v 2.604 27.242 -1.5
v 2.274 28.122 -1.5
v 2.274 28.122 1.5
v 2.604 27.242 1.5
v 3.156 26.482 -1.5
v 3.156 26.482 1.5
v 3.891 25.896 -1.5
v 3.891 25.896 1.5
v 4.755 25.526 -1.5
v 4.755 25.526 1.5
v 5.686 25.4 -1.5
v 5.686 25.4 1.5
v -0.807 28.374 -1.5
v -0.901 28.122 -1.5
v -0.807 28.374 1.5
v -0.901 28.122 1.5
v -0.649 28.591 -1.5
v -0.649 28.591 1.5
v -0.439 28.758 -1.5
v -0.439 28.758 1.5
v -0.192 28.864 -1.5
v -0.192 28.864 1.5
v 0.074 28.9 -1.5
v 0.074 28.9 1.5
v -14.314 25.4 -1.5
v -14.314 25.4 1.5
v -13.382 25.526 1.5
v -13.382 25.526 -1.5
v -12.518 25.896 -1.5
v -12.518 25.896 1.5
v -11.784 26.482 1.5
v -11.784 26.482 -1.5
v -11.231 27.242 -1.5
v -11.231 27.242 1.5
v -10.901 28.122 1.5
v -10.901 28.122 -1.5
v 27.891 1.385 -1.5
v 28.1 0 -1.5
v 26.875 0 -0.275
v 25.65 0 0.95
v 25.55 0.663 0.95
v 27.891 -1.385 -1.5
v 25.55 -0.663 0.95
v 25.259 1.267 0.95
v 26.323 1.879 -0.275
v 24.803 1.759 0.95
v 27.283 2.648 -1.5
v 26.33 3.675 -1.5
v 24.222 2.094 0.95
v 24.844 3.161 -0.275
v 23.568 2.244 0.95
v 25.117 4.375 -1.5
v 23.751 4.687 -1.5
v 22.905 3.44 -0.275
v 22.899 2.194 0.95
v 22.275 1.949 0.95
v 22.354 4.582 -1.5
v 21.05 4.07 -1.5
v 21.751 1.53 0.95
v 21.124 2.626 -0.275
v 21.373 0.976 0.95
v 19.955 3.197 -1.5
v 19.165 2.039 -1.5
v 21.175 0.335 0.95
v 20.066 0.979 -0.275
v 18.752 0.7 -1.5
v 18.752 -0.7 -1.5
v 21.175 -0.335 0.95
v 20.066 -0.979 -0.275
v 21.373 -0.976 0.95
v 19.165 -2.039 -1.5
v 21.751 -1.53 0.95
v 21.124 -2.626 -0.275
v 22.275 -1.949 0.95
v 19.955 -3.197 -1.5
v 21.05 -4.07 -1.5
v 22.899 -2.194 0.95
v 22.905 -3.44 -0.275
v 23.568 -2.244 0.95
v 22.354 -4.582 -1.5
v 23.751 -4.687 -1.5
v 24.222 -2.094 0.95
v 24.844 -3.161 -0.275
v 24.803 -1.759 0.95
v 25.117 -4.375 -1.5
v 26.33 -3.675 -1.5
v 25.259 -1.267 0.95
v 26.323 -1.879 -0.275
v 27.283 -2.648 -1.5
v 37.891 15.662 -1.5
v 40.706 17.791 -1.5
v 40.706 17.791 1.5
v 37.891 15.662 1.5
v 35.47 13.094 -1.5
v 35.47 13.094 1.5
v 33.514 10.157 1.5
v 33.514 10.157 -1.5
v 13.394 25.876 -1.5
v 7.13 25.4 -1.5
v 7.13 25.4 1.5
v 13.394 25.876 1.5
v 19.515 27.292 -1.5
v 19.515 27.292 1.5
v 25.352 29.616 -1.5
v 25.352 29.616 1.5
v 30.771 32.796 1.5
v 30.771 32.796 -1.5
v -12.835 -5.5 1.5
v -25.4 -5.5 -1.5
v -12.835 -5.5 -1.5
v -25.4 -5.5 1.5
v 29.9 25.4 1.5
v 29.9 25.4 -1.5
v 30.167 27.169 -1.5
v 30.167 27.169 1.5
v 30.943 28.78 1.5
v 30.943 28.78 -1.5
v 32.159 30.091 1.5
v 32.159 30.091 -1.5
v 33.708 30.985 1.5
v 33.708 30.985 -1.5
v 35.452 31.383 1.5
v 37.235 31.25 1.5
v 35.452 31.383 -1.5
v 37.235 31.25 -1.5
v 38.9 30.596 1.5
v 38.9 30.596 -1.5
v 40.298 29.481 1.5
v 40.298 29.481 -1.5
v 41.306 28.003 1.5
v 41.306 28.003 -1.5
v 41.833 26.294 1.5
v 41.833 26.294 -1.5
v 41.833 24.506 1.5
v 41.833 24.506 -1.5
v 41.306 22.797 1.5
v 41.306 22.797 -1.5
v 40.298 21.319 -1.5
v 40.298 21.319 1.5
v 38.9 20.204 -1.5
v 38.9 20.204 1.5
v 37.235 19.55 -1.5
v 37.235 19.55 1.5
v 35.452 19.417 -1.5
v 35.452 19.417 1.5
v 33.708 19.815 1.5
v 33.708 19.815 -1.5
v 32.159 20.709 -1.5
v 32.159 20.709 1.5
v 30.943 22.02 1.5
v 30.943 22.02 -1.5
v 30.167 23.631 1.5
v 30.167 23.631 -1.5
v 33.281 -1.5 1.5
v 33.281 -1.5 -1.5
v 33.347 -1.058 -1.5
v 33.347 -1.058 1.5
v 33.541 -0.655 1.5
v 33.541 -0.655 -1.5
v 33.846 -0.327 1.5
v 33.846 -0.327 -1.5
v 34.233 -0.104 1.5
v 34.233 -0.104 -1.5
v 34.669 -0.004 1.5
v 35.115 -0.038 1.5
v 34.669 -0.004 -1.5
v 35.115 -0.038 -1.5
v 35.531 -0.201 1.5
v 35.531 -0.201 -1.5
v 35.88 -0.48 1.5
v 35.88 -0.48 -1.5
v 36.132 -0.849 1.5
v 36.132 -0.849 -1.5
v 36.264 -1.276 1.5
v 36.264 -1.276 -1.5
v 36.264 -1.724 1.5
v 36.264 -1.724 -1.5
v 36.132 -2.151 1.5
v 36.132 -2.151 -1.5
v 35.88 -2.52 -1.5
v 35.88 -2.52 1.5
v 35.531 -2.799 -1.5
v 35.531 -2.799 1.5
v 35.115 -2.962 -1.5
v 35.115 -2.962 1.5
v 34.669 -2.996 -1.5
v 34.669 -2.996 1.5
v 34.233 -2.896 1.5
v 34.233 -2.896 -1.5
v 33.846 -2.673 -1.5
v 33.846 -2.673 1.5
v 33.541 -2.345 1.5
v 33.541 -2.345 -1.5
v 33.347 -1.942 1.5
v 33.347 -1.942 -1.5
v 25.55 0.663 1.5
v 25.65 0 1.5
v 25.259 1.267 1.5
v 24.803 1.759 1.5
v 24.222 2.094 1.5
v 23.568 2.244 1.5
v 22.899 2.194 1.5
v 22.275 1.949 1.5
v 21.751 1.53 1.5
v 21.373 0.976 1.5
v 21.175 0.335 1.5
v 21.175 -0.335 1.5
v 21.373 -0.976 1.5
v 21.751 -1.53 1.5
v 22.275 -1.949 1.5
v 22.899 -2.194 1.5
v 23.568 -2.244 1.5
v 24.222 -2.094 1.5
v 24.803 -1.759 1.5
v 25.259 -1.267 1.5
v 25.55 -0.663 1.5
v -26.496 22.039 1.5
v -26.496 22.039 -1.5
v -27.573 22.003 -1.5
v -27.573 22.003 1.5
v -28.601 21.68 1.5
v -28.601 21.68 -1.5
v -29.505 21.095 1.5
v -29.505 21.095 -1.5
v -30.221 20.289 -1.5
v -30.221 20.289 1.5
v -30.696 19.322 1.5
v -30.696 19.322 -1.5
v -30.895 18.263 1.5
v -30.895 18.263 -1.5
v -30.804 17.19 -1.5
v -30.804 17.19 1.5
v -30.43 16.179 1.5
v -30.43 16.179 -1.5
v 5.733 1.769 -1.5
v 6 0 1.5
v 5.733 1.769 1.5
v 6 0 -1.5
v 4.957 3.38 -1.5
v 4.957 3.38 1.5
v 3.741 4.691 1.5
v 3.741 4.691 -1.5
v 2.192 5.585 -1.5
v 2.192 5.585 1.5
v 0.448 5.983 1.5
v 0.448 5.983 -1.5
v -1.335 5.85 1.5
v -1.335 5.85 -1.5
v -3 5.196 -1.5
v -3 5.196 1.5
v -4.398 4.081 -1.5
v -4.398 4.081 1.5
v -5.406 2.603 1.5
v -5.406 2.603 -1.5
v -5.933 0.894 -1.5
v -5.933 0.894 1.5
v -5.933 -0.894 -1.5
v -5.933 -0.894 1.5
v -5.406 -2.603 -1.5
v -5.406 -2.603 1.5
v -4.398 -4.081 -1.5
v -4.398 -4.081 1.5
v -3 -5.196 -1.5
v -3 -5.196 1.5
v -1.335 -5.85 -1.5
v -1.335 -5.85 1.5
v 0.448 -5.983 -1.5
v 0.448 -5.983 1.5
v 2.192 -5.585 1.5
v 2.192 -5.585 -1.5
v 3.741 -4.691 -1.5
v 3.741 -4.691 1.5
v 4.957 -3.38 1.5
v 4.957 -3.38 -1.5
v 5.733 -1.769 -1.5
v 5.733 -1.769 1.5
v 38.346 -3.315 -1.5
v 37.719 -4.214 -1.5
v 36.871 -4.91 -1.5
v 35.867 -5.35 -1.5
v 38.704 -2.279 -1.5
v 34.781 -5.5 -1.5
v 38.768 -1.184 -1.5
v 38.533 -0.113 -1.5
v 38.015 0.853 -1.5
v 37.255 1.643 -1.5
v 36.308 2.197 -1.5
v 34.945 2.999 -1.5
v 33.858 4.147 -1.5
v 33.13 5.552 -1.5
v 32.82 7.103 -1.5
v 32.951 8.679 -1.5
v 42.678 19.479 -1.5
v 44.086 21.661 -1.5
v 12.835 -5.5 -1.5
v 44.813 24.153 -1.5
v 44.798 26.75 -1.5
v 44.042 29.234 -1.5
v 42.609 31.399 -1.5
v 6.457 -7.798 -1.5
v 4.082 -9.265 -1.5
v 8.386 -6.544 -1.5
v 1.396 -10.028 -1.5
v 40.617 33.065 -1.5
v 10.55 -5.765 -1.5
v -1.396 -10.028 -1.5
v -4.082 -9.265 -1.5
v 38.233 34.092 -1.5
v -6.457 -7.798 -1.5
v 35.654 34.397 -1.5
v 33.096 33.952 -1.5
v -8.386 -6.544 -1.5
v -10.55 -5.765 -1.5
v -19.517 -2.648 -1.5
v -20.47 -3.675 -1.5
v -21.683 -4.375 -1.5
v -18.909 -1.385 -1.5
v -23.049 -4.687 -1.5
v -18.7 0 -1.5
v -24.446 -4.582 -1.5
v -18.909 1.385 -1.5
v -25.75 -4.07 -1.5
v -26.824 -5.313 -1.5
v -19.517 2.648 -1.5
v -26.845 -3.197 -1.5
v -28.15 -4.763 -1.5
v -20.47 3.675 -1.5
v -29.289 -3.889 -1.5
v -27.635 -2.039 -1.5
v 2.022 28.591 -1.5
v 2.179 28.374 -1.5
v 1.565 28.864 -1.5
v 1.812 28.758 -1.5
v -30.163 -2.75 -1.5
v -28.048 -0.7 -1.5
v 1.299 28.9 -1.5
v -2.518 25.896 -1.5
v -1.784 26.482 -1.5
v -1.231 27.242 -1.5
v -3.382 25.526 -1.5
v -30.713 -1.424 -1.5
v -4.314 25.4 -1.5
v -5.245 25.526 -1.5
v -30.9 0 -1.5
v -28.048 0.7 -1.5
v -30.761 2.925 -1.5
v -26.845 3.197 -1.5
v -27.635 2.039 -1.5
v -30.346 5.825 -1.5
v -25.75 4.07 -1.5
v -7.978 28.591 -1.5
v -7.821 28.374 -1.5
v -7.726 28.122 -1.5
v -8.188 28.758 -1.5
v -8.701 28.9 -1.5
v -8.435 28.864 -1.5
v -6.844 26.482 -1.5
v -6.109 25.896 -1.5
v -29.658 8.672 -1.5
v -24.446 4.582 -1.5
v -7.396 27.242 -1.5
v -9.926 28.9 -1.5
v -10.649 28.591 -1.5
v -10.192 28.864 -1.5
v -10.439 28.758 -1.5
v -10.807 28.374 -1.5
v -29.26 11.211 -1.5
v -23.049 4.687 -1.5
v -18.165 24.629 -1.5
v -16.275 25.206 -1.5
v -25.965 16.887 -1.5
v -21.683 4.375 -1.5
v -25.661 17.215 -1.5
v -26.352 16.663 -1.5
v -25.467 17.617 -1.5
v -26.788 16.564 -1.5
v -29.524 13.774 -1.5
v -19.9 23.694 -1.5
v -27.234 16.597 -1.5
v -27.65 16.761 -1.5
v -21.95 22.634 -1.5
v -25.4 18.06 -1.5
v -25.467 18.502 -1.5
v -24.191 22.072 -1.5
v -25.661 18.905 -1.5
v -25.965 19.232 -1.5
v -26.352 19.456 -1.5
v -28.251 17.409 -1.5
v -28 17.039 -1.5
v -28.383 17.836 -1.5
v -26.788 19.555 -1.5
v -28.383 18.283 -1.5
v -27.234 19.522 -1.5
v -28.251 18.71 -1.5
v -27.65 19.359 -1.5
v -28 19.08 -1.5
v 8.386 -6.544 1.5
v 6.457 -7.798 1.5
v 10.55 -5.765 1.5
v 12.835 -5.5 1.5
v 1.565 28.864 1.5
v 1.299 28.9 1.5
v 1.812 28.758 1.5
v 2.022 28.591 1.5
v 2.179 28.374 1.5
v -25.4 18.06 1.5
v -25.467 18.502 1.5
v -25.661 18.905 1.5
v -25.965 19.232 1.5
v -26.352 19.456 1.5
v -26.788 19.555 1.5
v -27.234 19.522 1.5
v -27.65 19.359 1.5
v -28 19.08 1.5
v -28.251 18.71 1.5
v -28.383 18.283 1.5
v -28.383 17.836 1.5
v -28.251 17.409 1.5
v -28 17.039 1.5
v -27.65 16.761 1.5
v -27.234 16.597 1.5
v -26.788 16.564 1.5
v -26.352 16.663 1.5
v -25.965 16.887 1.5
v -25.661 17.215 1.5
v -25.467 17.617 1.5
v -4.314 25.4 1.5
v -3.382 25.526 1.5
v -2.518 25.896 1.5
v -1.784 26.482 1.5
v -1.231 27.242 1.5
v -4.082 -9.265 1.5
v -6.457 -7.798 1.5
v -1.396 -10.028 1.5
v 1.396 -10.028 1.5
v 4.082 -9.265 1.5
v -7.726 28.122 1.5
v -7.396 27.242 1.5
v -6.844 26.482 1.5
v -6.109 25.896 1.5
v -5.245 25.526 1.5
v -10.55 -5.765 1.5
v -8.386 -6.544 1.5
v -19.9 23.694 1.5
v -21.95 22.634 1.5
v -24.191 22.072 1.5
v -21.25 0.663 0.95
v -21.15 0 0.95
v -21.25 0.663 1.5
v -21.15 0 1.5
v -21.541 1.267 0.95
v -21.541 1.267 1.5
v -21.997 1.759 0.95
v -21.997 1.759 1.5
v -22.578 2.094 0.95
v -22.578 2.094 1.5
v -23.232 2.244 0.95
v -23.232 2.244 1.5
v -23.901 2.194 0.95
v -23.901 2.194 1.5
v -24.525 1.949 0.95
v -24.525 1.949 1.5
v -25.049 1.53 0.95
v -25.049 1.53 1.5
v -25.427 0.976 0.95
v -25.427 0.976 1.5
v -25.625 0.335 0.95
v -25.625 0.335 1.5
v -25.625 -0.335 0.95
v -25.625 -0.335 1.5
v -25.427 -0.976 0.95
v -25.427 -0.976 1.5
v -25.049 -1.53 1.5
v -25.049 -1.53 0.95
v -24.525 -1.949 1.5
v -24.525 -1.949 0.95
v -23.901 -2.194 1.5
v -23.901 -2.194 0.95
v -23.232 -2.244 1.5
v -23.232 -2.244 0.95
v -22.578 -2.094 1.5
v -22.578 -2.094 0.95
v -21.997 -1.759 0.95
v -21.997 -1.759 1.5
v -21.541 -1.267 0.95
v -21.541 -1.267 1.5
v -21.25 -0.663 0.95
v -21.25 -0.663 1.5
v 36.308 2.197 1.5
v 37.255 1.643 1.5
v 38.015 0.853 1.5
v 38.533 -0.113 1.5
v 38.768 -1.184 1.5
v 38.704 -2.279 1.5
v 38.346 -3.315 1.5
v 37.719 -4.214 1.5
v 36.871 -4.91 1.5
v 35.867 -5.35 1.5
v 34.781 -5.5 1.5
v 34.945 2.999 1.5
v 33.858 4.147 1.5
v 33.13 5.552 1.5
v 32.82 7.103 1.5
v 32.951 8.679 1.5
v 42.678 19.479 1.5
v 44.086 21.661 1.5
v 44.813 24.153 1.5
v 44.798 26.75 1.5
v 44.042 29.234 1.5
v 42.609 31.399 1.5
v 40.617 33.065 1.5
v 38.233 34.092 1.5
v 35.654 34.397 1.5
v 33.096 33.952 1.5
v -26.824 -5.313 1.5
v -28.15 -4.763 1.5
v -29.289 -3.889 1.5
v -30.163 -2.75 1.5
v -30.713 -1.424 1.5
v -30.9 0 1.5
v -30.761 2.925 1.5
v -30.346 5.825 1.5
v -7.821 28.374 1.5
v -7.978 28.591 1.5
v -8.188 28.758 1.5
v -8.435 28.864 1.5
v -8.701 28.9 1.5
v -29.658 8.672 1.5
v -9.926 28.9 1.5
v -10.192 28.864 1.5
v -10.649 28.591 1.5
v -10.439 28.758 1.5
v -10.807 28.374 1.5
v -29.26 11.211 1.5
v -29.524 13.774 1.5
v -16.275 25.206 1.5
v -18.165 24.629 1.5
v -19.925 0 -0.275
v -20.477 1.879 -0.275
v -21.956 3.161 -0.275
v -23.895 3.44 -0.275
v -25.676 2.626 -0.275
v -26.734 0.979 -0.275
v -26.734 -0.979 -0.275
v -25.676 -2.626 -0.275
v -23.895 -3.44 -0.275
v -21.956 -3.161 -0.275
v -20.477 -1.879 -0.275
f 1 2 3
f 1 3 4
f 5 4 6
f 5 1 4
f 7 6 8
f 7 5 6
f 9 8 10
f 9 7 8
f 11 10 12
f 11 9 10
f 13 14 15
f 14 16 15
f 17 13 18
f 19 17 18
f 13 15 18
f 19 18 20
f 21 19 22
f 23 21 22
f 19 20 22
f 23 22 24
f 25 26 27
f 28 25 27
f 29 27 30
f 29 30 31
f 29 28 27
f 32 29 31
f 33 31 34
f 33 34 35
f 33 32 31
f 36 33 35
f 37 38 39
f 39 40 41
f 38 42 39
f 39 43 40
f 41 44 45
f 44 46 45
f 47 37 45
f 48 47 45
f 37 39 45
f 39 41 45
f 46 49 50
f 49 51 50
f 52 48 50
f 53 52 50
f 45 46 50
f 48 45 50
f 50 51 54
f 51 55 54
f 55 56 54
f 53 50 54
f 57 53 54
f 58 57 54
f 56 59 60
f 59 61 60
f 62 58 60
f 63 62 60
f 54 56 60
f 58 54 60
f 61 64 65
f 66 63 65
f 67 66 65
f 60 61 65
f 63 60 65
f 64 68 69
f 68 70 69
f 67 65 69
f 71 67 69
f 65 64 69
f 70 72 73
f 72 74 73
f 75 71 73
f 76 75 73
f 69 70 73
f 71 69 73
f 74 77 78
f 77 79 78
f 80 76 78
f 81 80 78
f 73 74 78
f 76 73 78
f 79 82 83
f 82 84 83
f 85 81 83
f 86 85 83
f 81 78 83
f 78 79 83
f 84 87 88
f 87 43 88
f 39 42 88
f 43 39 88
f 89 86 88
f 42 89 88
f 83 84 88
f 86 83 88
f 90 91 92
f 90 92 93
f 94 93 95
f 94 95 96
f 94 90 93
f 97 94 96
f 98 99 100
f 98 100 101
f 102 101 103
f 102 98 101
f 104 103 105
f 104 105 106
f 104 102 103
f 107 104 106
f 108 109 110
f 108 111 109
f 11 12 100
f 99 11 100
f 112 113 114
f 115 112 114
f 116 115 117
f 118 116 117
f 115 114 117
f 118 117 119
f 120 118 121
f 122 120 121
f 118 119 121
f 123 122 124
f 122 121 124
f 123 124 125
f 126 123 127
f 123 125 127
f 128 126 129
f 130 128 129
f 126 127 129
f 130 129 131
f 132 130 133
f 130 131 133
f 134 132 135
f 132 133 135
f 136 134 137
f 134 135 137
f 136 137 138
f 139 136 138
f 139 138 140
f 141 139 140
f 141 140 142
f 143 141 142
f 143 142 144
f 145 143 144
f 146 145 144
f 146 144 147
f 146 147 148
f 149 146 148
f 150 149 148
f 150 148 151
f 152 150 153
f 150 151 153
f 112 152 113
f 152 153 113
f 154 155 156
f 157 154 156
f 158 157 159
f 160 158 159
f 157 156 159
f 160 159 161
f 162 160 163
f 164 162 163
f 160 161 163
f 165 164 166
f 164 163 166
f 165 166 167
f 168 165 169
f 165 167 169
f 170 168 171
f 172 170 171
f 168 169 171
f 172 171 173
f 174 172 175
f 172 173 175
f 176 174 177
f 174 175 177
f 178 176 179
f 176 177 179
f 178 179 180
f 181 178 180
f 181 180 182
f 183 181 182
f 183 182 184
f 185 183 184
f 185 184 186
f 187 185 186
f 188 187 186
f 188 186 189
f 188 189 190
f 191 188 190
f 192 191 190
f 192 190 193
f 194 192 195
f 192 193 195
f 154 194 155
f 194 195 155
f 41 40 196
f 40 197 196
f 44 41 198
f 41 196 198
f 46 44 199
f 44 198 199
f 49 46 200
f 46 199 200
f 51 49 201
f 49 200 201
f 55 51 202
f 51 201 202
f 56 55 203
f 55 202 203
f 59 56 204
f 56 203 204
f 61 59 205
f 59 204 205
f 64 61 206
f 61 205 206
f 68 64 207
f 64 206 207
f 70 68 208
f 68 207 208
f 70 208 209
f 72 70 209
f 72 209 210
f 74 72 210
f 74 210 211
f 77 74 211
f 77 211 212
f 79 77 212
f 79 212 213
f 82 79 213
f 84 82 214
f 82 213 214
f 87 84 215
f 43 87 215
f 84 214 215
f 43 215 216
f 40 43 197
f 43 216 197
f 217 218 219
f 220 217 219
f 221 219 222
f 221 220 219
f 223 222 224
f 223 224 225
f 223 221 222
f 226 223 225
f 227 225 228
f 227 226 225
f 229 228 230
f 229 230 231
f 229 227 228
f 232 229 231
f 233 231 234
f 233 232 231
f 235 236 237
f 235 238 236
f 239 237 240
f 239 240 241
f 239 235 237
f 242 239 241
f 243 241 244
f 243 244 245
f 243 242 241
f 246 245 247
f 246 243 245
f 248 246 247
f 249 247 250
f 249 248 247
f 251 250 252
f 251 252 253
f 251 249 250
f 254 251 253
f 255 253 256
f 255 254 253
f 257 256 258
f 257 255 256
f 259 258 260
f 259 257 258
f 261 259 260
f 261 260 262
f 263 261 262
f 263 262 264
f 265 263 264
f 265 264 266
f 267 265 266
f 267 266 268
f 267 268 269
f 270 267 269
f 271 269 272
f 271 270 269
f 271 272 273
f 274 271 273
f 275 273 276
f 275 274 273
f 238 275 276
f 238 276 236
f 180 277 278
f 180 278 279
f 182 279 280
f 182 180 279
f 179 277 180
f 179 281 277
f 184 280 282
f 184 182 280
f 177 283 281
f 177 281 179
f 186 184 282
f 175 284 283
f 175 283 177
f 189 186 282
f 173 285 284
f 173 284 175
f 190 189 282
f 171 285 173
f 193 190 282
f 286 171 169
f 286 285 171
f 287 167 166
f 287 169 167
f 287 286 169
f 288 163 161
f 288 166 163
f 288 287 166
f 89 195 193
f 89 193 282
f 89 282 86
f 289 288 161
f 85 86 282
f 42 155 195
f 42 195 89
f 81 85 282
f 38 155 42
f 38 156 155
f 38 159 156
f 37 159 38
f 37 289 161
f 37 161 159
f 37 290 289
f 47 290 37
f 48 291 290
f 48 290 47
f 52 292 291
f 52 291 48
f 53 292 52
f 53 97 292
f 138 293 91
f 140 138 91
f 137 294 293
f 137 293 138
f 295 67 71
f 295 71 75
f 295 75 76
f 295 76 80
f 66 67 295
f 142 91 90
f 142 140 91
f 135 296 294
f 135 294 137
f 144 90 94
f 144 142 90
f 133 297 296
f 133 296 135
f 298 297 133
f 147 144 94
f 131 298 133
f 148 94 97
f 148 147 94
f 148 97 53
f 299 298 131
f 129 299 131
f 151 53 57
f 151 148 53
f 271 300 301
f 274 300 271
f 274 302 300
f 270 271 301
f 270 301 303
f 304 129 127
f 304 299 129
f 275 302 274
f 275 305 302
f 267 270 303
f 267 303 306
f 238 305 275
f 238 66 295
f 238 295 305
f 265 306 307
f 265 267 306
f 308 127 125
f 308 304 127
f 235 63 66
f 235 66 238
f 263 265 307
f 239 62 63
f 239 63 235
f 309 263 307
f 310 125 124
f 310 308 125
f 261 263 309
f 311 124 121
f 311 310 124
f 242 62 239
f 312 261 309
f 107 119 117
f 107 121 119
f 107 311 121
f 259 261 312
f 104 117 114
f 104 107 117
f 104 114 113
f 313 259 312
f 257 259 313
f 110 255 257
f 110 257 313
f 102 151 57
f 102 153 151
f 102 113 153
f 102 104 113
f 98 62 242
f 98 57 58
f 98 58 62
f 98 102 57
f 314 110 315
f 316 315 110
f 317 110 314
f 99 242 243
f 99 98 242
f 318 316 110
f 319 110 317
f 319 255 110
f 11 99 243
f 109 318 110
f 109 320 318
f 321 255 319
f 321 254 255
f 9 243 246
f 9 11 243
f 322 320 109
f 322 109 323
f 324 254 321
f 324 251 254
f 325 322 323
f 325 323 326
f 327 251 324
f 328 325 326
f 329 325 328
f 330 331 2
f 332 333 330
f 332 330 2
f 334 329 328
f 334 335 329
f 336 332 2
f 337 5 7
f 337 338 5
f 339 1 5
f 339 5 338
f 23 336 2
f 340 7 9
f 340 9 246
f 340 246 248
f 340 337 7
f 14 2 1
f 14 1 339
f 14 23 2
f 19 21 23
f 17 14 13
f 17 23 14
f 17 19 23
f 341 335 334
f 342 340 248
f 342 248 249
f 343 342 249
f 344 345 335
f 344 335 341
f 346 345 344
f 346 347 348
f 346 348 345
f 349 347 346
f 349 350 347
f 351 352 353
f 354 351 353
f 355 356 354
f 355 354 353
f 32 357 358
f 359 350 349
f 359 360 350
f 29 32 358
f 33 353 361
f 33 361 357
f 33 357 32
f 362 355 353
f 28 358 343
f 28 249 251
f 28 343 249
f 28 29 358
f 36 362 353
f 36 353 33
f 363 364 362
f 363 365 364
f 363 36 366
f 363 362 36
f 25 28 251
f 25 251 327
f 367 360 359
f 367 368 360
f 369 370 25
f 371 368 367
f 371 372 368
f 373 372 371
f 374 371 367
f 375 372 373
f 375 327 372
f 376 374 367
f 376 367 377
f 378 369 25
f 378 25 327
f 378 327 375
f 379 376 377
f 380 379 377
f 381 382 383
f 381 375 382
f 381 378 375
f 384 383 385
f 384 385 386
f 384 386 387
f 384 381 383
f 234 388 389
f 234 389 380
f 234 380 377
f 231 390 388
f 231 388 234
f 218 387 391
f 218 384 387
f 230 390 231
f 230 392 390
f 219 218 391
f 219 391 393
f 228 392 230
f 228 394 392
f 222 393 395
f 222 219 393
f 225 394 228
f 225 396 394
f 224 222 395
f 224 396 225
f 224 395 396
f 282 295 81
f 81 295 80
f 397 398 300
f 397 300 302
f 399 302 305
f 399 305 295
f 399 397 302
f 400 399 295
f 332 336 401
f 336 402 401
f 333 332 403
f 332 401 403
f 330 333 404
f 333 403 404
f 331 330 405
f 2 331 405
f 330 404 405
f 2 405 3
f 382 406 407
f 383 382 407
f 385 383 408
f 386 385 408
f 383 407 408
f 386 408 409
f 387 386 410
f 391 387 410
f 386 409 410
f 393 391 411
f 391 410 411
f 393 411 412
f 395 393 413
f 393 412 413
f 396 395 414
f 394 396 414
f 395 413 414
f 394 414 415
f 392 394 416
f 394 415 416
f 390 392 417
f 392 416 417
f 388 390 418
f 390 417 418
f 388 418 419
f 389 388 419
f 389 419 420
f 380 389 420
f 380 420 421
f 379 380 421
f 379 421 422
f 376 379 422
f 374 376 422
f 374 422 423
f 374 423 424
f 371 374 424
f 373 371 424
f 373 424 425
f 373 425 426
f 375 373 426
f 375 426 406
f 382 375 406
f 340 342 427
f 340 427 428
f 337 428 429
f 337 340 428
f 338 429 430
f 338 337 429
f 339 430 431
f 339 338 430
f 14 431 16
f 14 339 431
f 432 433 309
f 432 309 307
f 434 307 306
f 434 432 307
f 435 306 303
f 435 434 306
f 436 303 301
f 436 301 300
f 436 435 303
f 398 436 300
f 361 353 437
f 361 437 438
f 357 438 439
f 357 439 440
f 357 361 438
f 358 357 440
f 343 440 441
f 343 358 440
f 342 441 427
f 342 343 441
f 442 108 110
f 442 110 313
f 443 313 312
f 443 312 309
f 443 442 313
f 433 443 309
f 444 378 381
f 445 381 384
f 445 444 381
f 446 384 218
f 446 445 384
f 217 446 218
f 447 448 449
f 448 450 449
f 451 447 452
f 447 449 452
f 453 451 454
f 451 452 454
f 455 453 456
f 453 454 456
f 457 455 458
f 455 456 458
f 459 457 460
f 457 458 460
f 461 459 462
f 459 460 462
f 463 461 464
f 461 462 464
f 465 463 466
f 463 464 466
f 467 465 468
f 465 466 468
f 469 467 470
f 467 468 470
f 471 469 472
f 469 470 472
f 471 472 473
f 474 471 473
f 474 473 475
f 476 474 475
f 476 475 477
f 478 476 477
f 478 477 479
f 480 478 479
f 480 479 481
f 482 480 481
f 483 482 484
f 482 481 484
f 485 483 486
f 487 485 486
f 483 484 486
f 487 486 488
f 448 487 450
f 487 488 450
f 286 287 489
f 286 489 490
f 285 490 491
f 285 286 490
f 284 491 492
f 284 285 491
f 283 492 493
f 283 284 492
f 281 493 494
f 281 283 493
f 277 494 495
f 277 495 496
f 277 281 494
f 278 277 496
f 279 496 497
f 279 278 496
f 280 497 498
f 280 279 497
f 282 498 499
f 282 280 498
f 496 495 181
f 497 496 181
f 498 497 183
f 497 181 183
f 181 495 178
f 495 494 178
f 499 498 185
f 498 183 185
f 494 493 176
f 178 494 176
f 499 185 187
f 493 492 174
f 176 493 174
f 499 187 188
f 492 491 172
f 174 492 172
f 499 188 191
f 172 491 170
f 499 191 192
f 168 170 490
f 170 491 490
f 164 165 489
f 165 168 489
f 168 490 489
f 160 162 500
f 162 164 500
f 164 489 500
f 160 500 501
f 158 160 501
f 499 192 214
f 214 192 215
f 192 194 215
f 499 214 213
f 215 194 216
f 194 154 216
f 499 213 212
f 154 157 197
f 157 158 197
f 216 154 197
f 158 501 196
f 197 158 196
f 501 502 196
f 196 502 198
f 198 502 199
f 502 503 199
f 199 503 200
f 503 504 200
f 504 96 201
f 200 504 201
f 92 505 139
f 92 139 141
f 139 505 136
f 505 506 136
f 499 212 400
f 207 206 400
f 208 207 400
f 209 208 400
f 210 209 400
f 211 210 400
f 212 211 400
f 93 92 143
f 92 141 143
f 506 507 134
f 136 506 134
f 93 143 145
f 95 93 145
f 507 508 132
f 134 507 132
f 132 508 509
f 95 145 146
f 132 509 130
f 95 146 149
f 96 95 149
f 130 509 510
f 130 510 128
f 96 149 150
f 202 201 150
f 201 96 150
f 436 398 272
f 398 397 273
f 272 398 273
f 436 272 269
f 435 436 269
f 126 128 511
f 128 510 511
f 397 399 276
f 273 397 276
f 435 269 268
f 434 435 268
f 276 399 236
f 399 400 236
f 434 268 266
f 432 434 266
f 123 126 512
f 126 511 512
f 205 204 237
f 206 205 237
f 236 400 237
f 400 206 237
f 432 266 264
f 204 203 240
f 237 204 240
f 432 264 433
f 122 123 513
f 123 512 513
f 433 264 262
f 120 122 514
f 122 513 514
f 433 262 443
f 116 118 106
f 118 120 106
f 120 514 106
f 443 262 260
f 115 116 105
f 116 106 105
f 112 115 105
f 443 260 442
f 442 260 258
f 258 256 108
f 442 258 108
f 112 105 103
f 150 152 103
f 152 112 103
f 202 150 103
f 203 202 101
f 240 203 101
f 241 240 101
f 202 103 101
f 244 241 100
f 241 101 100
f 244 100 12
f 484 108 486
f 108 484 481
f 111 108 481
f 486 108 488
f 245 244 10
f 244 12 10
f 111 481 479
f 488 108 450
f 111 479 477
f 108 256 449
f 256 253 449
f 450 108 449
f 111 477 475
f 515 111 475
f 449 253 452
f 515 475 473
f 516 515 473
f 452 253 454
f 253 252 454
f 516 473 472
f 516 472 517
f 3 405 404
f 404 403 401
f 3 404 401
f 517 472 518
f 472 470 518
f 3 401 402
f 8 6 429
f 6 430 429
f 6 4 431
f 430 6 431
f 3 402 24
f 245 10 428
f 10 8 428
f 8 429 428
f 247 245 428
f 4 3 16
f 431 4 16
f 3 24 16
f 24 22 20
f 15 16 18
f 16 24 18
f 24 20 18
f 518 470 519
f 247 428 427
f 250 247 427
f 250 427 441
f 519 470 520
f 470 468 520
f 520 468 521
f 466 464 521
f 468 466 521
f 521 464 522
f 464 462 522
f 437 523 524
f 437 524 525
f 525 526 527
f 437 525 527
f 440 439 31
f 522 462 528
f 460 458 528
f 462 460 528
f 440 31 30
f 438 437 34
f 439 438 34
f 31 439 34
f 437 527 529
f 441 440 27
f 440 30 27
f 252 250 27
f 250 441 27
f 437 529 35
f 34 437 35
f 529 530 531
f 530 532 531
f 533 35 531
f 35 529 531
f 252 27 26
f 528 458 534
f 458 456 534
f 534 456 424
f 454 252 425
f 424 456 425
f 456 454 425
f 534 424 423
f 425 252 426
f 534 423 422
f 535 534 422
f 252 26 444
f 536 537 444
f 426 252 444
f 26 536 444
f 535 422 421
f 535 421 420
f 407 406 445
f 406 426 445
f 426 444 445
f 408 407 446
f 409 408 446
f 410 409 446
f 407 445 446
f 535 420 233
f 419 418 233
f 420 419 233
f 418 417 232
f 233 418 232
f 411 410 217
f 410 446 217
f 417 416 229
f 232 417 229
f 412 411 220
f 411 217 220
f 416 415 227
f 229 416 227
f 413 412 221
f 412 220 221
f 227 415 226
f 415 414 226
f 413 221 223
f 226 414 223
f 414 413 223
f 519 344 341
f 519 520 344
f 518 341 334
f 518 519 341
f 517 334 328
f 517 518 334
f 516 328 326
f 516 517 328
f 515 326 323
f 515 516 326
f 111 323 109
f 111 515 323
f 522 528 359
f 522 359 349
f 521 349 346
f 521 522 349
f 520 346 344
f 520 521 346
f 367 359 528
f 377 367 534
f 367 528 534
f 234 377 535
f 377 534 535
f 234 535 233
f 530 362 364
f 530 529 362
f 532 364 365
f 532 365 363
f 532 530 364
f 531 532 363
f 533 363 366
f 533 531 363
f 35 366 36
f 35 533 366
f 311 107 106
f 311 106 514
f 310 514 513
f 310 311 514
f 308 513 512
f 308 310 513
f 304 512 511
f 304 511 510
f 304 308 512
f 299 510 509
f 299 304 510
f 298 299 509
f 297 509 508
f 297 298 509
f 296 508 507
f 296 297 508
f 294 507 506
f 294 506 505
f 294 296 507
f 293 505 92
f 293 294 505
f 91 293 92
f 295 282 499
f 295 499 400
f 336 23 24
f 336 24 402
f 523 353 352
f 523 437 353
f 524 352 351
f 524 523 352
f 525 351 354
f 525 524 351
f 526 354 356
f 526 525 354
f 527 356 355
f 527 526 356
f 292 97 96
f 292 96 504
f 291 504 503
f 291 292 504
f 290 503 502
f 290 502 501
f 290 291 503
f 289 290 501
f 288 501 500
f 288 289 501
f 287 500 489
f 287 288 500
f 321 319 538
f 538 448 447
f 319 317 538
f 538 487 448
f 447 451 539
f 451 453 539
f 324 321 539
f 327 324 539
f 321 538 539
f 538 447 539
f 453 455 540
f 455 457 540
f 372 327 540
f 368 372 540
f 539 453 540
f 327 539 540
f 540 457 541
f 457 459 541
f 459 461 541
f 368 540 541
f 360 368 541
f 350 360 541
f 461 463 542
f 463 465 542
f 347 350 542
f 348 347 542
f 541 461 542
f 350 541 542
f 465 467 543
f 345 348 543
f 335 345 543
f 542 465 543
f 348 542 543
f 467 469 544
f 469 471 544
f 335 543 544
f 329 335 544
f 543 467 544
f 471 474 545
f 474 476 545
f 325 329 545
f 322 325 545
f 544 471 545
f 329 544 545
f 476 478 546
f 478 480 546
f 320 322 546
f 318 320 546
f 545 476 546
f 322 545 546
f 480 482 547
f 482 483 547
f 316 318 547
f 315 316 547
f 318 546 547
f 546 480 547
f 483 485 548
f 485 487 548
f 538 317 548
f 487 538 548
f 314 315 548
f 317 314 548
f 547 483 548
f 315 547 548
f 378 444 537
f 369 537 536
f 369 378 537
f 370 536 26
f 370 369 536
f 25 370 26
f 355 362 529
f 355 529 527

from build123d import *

# Parameters (mm, degrees)
SKETCH1_R                                           = 6
BOSS_EXTRUDE1_DEPTH                                 = 1.5
SKETCH2_R                                           = 4
SKETCH2_R_2                                         = 1.5
BOSS_EXTRUDE2_DEPTH                                 = 3
FILLET1_R                                           = 10
CSK_FOR_M4_COUNTERSUNK_FLAT_HEAD_SCREW1_D           = 4.5
CSK_FOR_M4_COUNTERSUNK_FLAT_HEAD_SCREW1_DEPTH       = 7.5
CSK_FOR_M4_COUNTERSUNK_FLAT_HEAD_SCREW1_CSINK_D     = 9.4
CSK_FOR_M4_COUNTERSUNK_FLAT_HEAD_SCREW1_CSINK_ANGLE = 90
CSK_FOR_M4_COUNTERSUNK_FLAT_HEAD_SCREW1_TIP         = 1.351936393
CUT_EXTRUDE1_DEPTH                                  = 44.802054894
FILLET2_R                                           = 10
SKETCH7_R                                           = 6
BOSS_EXTRUDE6_DEPTH                                 = 3
SKETCH10_R                                          = 1.5
BOSS_EXTRUDE7_DEPTH                                 = 3
BOSS_EXTRUDE8_DEPTH                                 = 3
FILLET3_R                                           = 1


with BuildPart() as part:
    # Sketch1 → Boss-Extrude1 (new, symmetric)
    with BuildSketch(Plane.XY):
        with BuildLine():
            Line((-25.4, -5.5), (-12.834896467, -5.5))
            ThreePointArc((-12.834896467, -5.5), (-9.445323242, -6.091982496), (-6.457063621, -7.797841329))
            ThreePointArc((-6.457063621, -7.797841329), (0, -10.124228366), (6.457063621, -7.797841329))
            ThreePointArc((6.457063621, -7.797841329), (9.445323242, -6.091982496), (12.834896467, -5.5))
            Line((12.834896467, -5.5), (25.4, -5.5))
            ThreePointArc((25.4, -5.5), (29.289087297, -3.889087297), (30.9, 0))
            ThreePointArc((30.9, 0), (0, 30.9), (-30.9, 0))
            ThreePointArc((-30.9, 0), (-29.289087297, -3.889087297), (-25.4, -5.5))
        make_face()
        Circle(SKETCH1_R, mode=Mode.SUBTRACT)
    extrude(amount=BOSS_EXTRUDE1_DEPTH, both=True)

    # Sketch2 → Boss-Extrude2 (add, through all)
    with BuildSketch(Plane.XY.offset(1.5)):
        with Locations((-26.9, 18.059623473)):
            Circle(SKETCH2_R)
        with Locations((-26.9, 18.059623473)):
            Circle(SKETCH2_R_2, mode=Mode.SUBTRACT)
    extrude(amount=-BOSS_EXTRUDE2_DEPTH)

    # Fillet1
    fillet1_edges = [part.edges().sort_by_distance(p)[0] for p in [
        (-27.493457726, 14.10389245, 0),
        (-23.463459093, 20.106618, 0),
    ]]
    fillet(fillet1_edges, radius=FILLET1_R)

    # CSK for M4 Countersunk Flat Head Screw1
    with Locations(Plane(origin=(0, 0, -1.5), x_dir=(-1, 0, 0), z_dir=(0, 0, -1))):
        with Locations((-23.4, 0), (23.4, 0)):
            CounterSinkHole(CSK_FOR_M4_COUNTERSUNK_FLAT_HEAD_SCREW1_D / 2, CSK_FOR_M4_COUNTERSUNK_FLAT_HEAD_SCREW1_CSINK_D / 2, depth=CSK_FOR_M4_COUNTERSUNK_FLAT_HEAD_SCREW1_DEPTH, counter_sink_angle=CSK_FOR_M4_COUNTERSUNK_FLAT_HEAD_SCREW1_CSINK_ANGLE)
            with Locations((0, 0, -(CSK_FOR_M4_COUNTERSUNK_FLAT_HEAD_SCREW1_DEPTH + CSK_FOR_M4_COUNTERSUNK_FLAT_HEAD_SCREW1_TIP / 2))):  # 118° drill point
                Cone(0, CSK_FOR_M4_COUNTERSUNK_FLAT_HEAD_SCREW1_D / 2, CSK_FOR_M4_COUNTERSUNK_FLAT_HEAD_SCREW1_TIP, mode=Mode.SUBTRACT)

    # Sketch6 → Cut-Extrude1 (cut, through all)
    with BuildSketch(Plane.XY.offset(1.5)):
        with BuildLine():
            Line((-17.596874723, 25.4), (17.596874723, 25.4))
            ThreePointArc((17.596874723, 25.4), (0, 30.9), (-17.596874723, 25.4))
        make_face()
    extrude(amount=-CUT_EXTRUDE1_DEPTH, mode=Mode.SUBTRACT)

    # Fillet2
    fillet2_edges = [part.edges().sort_by_distance(p)[0] for p in [
        (17.596874723, 25.4, 0),
        (-17.596874723, 25.4, 0),
    ]]
    fillet(fillet2_edges, radius=FILLET2_R)

    # Sketch7 → Boss-Extrude6 (add, through all)
    with BuildSketch(Plane(origin=(0, 0, -1.5), x_dir=(-1, 0, 0), z_dir=(0, 0, -1))):
        with BuildLine():
            Line((-14.129755837, 25.4), (-7.129755837, 25.4))
            ThreePointArc((-7.129755837, 25.4), (-19.515300955, 27.292035274), (-30.771089101, 32.795557652))
            ThreePointArc((-30.771089101, 32.795557652), (-43.404263963, 30.368503031), (-40.705792002, 17.790508346))
            ThreePointArc((-40.705792002, 17.790508346), (-33.513792252, 10.156964901), (-30.9, 0))
            ThreePointArc((-30.9, 0), (-28.287130475, 12.435764935), (-20.890404562, 22.768421053))
            ThreePointArc((-20.890404562, 22.768421053), (-17.757137087, 24.718911163), (-14.129755837, 25.4))
        make_face()
        with Locations((-35.9, 25.4)):
            Circle(SKETCH7_R, mode=Mode.SUBTRACT)
    extrude(amount=-BOSS_EXTRUDE6_DEPTH)

    # Sketch10 → Boss-Extrude7 (add, through all)
    with BuildSketch(Plane(origin=(0, 0, -1.5), x_dir=(-1, 0, 0), z_dir=(0, 0, -1))):
        with BuildLine():
            Line((-34.78083152, -5.5), (-25.4, -5.5))
            ThreePointArc((-25.4, -5.5), (-29.289087297, -3.889087297), (-30.9, 0))
            ThreePointArc((-30.9, 0), (-31.563922472, 5.243945221), (-33.513792252, 10.156964901))
            ThreePointArc((-33.513792252, 10.156964901), (-33.13038334, 5.551807562), (-36.308268134, 2.196882117))
            ThreePointArc((-36.308268134, 2.196882117), (-38.704320303, -2.278611434), (-34.78083152, -5.5))
        make_face()
        with Locations((-34.78083152, -1.5)):
            Circle(SKETCH10_R, mode=Mode.SUBTRACT)
    extrude(amount=-BOSS_EXTRUDE7_DEPTH)

    # Sketch12 → Boss-Extrude8 (add, through all)
    with BuildSketch(Plane(origin=(0, 0, -1.5), x_dir=(-1, 0, 0), z_dir=(0, 0, -1))):
        with BuildLine():
            ThreePointArc((7.813736863, 28.9), (6.788610597, 26.425126266), (4.313736863, 25.4))
            Line((4.313736863, 25.4), (14.313736863, 25.4))
            ThreePointArc((14.313736863, 25.4), (11.838863129, 26.425126266), (10.813736863, 28.9))
            Line((10.813736863, 28.9), (7.813736863, 28.9))
        make_face()
        with BuildLine():
            ThreePointArc((4.313736863, 25.4), (1.838863129, 26.425126266), (0.813736863, 28.9))
            Line((0.813736863, 28.9), (-2.186263137, 28.9))
            ThreePointArc((-2.186263137, 28.9), (-3.211389403, 26.425126266), (-5.686263137, 25.4))
            Line((-5.686263137, 25.4), (4.313736863, 25.4))
        make_face()
    extrude(amount=-BOSS_EXTRUDE8_DEPTH)

    # Fillet3
    fillet3_edges = [part.edges().sort_by_distance(p)[0] for p in [
        (-10.813736863, 28.9, 0),
        (-7.813736863, 28.9, 0),
        (2.186263137, 28.9, 0),
        (-0.813736863, 28.9, 0),
    ]]
    fillet(fillet3_edges, radius=FILLET3_R)


solid = part.part
